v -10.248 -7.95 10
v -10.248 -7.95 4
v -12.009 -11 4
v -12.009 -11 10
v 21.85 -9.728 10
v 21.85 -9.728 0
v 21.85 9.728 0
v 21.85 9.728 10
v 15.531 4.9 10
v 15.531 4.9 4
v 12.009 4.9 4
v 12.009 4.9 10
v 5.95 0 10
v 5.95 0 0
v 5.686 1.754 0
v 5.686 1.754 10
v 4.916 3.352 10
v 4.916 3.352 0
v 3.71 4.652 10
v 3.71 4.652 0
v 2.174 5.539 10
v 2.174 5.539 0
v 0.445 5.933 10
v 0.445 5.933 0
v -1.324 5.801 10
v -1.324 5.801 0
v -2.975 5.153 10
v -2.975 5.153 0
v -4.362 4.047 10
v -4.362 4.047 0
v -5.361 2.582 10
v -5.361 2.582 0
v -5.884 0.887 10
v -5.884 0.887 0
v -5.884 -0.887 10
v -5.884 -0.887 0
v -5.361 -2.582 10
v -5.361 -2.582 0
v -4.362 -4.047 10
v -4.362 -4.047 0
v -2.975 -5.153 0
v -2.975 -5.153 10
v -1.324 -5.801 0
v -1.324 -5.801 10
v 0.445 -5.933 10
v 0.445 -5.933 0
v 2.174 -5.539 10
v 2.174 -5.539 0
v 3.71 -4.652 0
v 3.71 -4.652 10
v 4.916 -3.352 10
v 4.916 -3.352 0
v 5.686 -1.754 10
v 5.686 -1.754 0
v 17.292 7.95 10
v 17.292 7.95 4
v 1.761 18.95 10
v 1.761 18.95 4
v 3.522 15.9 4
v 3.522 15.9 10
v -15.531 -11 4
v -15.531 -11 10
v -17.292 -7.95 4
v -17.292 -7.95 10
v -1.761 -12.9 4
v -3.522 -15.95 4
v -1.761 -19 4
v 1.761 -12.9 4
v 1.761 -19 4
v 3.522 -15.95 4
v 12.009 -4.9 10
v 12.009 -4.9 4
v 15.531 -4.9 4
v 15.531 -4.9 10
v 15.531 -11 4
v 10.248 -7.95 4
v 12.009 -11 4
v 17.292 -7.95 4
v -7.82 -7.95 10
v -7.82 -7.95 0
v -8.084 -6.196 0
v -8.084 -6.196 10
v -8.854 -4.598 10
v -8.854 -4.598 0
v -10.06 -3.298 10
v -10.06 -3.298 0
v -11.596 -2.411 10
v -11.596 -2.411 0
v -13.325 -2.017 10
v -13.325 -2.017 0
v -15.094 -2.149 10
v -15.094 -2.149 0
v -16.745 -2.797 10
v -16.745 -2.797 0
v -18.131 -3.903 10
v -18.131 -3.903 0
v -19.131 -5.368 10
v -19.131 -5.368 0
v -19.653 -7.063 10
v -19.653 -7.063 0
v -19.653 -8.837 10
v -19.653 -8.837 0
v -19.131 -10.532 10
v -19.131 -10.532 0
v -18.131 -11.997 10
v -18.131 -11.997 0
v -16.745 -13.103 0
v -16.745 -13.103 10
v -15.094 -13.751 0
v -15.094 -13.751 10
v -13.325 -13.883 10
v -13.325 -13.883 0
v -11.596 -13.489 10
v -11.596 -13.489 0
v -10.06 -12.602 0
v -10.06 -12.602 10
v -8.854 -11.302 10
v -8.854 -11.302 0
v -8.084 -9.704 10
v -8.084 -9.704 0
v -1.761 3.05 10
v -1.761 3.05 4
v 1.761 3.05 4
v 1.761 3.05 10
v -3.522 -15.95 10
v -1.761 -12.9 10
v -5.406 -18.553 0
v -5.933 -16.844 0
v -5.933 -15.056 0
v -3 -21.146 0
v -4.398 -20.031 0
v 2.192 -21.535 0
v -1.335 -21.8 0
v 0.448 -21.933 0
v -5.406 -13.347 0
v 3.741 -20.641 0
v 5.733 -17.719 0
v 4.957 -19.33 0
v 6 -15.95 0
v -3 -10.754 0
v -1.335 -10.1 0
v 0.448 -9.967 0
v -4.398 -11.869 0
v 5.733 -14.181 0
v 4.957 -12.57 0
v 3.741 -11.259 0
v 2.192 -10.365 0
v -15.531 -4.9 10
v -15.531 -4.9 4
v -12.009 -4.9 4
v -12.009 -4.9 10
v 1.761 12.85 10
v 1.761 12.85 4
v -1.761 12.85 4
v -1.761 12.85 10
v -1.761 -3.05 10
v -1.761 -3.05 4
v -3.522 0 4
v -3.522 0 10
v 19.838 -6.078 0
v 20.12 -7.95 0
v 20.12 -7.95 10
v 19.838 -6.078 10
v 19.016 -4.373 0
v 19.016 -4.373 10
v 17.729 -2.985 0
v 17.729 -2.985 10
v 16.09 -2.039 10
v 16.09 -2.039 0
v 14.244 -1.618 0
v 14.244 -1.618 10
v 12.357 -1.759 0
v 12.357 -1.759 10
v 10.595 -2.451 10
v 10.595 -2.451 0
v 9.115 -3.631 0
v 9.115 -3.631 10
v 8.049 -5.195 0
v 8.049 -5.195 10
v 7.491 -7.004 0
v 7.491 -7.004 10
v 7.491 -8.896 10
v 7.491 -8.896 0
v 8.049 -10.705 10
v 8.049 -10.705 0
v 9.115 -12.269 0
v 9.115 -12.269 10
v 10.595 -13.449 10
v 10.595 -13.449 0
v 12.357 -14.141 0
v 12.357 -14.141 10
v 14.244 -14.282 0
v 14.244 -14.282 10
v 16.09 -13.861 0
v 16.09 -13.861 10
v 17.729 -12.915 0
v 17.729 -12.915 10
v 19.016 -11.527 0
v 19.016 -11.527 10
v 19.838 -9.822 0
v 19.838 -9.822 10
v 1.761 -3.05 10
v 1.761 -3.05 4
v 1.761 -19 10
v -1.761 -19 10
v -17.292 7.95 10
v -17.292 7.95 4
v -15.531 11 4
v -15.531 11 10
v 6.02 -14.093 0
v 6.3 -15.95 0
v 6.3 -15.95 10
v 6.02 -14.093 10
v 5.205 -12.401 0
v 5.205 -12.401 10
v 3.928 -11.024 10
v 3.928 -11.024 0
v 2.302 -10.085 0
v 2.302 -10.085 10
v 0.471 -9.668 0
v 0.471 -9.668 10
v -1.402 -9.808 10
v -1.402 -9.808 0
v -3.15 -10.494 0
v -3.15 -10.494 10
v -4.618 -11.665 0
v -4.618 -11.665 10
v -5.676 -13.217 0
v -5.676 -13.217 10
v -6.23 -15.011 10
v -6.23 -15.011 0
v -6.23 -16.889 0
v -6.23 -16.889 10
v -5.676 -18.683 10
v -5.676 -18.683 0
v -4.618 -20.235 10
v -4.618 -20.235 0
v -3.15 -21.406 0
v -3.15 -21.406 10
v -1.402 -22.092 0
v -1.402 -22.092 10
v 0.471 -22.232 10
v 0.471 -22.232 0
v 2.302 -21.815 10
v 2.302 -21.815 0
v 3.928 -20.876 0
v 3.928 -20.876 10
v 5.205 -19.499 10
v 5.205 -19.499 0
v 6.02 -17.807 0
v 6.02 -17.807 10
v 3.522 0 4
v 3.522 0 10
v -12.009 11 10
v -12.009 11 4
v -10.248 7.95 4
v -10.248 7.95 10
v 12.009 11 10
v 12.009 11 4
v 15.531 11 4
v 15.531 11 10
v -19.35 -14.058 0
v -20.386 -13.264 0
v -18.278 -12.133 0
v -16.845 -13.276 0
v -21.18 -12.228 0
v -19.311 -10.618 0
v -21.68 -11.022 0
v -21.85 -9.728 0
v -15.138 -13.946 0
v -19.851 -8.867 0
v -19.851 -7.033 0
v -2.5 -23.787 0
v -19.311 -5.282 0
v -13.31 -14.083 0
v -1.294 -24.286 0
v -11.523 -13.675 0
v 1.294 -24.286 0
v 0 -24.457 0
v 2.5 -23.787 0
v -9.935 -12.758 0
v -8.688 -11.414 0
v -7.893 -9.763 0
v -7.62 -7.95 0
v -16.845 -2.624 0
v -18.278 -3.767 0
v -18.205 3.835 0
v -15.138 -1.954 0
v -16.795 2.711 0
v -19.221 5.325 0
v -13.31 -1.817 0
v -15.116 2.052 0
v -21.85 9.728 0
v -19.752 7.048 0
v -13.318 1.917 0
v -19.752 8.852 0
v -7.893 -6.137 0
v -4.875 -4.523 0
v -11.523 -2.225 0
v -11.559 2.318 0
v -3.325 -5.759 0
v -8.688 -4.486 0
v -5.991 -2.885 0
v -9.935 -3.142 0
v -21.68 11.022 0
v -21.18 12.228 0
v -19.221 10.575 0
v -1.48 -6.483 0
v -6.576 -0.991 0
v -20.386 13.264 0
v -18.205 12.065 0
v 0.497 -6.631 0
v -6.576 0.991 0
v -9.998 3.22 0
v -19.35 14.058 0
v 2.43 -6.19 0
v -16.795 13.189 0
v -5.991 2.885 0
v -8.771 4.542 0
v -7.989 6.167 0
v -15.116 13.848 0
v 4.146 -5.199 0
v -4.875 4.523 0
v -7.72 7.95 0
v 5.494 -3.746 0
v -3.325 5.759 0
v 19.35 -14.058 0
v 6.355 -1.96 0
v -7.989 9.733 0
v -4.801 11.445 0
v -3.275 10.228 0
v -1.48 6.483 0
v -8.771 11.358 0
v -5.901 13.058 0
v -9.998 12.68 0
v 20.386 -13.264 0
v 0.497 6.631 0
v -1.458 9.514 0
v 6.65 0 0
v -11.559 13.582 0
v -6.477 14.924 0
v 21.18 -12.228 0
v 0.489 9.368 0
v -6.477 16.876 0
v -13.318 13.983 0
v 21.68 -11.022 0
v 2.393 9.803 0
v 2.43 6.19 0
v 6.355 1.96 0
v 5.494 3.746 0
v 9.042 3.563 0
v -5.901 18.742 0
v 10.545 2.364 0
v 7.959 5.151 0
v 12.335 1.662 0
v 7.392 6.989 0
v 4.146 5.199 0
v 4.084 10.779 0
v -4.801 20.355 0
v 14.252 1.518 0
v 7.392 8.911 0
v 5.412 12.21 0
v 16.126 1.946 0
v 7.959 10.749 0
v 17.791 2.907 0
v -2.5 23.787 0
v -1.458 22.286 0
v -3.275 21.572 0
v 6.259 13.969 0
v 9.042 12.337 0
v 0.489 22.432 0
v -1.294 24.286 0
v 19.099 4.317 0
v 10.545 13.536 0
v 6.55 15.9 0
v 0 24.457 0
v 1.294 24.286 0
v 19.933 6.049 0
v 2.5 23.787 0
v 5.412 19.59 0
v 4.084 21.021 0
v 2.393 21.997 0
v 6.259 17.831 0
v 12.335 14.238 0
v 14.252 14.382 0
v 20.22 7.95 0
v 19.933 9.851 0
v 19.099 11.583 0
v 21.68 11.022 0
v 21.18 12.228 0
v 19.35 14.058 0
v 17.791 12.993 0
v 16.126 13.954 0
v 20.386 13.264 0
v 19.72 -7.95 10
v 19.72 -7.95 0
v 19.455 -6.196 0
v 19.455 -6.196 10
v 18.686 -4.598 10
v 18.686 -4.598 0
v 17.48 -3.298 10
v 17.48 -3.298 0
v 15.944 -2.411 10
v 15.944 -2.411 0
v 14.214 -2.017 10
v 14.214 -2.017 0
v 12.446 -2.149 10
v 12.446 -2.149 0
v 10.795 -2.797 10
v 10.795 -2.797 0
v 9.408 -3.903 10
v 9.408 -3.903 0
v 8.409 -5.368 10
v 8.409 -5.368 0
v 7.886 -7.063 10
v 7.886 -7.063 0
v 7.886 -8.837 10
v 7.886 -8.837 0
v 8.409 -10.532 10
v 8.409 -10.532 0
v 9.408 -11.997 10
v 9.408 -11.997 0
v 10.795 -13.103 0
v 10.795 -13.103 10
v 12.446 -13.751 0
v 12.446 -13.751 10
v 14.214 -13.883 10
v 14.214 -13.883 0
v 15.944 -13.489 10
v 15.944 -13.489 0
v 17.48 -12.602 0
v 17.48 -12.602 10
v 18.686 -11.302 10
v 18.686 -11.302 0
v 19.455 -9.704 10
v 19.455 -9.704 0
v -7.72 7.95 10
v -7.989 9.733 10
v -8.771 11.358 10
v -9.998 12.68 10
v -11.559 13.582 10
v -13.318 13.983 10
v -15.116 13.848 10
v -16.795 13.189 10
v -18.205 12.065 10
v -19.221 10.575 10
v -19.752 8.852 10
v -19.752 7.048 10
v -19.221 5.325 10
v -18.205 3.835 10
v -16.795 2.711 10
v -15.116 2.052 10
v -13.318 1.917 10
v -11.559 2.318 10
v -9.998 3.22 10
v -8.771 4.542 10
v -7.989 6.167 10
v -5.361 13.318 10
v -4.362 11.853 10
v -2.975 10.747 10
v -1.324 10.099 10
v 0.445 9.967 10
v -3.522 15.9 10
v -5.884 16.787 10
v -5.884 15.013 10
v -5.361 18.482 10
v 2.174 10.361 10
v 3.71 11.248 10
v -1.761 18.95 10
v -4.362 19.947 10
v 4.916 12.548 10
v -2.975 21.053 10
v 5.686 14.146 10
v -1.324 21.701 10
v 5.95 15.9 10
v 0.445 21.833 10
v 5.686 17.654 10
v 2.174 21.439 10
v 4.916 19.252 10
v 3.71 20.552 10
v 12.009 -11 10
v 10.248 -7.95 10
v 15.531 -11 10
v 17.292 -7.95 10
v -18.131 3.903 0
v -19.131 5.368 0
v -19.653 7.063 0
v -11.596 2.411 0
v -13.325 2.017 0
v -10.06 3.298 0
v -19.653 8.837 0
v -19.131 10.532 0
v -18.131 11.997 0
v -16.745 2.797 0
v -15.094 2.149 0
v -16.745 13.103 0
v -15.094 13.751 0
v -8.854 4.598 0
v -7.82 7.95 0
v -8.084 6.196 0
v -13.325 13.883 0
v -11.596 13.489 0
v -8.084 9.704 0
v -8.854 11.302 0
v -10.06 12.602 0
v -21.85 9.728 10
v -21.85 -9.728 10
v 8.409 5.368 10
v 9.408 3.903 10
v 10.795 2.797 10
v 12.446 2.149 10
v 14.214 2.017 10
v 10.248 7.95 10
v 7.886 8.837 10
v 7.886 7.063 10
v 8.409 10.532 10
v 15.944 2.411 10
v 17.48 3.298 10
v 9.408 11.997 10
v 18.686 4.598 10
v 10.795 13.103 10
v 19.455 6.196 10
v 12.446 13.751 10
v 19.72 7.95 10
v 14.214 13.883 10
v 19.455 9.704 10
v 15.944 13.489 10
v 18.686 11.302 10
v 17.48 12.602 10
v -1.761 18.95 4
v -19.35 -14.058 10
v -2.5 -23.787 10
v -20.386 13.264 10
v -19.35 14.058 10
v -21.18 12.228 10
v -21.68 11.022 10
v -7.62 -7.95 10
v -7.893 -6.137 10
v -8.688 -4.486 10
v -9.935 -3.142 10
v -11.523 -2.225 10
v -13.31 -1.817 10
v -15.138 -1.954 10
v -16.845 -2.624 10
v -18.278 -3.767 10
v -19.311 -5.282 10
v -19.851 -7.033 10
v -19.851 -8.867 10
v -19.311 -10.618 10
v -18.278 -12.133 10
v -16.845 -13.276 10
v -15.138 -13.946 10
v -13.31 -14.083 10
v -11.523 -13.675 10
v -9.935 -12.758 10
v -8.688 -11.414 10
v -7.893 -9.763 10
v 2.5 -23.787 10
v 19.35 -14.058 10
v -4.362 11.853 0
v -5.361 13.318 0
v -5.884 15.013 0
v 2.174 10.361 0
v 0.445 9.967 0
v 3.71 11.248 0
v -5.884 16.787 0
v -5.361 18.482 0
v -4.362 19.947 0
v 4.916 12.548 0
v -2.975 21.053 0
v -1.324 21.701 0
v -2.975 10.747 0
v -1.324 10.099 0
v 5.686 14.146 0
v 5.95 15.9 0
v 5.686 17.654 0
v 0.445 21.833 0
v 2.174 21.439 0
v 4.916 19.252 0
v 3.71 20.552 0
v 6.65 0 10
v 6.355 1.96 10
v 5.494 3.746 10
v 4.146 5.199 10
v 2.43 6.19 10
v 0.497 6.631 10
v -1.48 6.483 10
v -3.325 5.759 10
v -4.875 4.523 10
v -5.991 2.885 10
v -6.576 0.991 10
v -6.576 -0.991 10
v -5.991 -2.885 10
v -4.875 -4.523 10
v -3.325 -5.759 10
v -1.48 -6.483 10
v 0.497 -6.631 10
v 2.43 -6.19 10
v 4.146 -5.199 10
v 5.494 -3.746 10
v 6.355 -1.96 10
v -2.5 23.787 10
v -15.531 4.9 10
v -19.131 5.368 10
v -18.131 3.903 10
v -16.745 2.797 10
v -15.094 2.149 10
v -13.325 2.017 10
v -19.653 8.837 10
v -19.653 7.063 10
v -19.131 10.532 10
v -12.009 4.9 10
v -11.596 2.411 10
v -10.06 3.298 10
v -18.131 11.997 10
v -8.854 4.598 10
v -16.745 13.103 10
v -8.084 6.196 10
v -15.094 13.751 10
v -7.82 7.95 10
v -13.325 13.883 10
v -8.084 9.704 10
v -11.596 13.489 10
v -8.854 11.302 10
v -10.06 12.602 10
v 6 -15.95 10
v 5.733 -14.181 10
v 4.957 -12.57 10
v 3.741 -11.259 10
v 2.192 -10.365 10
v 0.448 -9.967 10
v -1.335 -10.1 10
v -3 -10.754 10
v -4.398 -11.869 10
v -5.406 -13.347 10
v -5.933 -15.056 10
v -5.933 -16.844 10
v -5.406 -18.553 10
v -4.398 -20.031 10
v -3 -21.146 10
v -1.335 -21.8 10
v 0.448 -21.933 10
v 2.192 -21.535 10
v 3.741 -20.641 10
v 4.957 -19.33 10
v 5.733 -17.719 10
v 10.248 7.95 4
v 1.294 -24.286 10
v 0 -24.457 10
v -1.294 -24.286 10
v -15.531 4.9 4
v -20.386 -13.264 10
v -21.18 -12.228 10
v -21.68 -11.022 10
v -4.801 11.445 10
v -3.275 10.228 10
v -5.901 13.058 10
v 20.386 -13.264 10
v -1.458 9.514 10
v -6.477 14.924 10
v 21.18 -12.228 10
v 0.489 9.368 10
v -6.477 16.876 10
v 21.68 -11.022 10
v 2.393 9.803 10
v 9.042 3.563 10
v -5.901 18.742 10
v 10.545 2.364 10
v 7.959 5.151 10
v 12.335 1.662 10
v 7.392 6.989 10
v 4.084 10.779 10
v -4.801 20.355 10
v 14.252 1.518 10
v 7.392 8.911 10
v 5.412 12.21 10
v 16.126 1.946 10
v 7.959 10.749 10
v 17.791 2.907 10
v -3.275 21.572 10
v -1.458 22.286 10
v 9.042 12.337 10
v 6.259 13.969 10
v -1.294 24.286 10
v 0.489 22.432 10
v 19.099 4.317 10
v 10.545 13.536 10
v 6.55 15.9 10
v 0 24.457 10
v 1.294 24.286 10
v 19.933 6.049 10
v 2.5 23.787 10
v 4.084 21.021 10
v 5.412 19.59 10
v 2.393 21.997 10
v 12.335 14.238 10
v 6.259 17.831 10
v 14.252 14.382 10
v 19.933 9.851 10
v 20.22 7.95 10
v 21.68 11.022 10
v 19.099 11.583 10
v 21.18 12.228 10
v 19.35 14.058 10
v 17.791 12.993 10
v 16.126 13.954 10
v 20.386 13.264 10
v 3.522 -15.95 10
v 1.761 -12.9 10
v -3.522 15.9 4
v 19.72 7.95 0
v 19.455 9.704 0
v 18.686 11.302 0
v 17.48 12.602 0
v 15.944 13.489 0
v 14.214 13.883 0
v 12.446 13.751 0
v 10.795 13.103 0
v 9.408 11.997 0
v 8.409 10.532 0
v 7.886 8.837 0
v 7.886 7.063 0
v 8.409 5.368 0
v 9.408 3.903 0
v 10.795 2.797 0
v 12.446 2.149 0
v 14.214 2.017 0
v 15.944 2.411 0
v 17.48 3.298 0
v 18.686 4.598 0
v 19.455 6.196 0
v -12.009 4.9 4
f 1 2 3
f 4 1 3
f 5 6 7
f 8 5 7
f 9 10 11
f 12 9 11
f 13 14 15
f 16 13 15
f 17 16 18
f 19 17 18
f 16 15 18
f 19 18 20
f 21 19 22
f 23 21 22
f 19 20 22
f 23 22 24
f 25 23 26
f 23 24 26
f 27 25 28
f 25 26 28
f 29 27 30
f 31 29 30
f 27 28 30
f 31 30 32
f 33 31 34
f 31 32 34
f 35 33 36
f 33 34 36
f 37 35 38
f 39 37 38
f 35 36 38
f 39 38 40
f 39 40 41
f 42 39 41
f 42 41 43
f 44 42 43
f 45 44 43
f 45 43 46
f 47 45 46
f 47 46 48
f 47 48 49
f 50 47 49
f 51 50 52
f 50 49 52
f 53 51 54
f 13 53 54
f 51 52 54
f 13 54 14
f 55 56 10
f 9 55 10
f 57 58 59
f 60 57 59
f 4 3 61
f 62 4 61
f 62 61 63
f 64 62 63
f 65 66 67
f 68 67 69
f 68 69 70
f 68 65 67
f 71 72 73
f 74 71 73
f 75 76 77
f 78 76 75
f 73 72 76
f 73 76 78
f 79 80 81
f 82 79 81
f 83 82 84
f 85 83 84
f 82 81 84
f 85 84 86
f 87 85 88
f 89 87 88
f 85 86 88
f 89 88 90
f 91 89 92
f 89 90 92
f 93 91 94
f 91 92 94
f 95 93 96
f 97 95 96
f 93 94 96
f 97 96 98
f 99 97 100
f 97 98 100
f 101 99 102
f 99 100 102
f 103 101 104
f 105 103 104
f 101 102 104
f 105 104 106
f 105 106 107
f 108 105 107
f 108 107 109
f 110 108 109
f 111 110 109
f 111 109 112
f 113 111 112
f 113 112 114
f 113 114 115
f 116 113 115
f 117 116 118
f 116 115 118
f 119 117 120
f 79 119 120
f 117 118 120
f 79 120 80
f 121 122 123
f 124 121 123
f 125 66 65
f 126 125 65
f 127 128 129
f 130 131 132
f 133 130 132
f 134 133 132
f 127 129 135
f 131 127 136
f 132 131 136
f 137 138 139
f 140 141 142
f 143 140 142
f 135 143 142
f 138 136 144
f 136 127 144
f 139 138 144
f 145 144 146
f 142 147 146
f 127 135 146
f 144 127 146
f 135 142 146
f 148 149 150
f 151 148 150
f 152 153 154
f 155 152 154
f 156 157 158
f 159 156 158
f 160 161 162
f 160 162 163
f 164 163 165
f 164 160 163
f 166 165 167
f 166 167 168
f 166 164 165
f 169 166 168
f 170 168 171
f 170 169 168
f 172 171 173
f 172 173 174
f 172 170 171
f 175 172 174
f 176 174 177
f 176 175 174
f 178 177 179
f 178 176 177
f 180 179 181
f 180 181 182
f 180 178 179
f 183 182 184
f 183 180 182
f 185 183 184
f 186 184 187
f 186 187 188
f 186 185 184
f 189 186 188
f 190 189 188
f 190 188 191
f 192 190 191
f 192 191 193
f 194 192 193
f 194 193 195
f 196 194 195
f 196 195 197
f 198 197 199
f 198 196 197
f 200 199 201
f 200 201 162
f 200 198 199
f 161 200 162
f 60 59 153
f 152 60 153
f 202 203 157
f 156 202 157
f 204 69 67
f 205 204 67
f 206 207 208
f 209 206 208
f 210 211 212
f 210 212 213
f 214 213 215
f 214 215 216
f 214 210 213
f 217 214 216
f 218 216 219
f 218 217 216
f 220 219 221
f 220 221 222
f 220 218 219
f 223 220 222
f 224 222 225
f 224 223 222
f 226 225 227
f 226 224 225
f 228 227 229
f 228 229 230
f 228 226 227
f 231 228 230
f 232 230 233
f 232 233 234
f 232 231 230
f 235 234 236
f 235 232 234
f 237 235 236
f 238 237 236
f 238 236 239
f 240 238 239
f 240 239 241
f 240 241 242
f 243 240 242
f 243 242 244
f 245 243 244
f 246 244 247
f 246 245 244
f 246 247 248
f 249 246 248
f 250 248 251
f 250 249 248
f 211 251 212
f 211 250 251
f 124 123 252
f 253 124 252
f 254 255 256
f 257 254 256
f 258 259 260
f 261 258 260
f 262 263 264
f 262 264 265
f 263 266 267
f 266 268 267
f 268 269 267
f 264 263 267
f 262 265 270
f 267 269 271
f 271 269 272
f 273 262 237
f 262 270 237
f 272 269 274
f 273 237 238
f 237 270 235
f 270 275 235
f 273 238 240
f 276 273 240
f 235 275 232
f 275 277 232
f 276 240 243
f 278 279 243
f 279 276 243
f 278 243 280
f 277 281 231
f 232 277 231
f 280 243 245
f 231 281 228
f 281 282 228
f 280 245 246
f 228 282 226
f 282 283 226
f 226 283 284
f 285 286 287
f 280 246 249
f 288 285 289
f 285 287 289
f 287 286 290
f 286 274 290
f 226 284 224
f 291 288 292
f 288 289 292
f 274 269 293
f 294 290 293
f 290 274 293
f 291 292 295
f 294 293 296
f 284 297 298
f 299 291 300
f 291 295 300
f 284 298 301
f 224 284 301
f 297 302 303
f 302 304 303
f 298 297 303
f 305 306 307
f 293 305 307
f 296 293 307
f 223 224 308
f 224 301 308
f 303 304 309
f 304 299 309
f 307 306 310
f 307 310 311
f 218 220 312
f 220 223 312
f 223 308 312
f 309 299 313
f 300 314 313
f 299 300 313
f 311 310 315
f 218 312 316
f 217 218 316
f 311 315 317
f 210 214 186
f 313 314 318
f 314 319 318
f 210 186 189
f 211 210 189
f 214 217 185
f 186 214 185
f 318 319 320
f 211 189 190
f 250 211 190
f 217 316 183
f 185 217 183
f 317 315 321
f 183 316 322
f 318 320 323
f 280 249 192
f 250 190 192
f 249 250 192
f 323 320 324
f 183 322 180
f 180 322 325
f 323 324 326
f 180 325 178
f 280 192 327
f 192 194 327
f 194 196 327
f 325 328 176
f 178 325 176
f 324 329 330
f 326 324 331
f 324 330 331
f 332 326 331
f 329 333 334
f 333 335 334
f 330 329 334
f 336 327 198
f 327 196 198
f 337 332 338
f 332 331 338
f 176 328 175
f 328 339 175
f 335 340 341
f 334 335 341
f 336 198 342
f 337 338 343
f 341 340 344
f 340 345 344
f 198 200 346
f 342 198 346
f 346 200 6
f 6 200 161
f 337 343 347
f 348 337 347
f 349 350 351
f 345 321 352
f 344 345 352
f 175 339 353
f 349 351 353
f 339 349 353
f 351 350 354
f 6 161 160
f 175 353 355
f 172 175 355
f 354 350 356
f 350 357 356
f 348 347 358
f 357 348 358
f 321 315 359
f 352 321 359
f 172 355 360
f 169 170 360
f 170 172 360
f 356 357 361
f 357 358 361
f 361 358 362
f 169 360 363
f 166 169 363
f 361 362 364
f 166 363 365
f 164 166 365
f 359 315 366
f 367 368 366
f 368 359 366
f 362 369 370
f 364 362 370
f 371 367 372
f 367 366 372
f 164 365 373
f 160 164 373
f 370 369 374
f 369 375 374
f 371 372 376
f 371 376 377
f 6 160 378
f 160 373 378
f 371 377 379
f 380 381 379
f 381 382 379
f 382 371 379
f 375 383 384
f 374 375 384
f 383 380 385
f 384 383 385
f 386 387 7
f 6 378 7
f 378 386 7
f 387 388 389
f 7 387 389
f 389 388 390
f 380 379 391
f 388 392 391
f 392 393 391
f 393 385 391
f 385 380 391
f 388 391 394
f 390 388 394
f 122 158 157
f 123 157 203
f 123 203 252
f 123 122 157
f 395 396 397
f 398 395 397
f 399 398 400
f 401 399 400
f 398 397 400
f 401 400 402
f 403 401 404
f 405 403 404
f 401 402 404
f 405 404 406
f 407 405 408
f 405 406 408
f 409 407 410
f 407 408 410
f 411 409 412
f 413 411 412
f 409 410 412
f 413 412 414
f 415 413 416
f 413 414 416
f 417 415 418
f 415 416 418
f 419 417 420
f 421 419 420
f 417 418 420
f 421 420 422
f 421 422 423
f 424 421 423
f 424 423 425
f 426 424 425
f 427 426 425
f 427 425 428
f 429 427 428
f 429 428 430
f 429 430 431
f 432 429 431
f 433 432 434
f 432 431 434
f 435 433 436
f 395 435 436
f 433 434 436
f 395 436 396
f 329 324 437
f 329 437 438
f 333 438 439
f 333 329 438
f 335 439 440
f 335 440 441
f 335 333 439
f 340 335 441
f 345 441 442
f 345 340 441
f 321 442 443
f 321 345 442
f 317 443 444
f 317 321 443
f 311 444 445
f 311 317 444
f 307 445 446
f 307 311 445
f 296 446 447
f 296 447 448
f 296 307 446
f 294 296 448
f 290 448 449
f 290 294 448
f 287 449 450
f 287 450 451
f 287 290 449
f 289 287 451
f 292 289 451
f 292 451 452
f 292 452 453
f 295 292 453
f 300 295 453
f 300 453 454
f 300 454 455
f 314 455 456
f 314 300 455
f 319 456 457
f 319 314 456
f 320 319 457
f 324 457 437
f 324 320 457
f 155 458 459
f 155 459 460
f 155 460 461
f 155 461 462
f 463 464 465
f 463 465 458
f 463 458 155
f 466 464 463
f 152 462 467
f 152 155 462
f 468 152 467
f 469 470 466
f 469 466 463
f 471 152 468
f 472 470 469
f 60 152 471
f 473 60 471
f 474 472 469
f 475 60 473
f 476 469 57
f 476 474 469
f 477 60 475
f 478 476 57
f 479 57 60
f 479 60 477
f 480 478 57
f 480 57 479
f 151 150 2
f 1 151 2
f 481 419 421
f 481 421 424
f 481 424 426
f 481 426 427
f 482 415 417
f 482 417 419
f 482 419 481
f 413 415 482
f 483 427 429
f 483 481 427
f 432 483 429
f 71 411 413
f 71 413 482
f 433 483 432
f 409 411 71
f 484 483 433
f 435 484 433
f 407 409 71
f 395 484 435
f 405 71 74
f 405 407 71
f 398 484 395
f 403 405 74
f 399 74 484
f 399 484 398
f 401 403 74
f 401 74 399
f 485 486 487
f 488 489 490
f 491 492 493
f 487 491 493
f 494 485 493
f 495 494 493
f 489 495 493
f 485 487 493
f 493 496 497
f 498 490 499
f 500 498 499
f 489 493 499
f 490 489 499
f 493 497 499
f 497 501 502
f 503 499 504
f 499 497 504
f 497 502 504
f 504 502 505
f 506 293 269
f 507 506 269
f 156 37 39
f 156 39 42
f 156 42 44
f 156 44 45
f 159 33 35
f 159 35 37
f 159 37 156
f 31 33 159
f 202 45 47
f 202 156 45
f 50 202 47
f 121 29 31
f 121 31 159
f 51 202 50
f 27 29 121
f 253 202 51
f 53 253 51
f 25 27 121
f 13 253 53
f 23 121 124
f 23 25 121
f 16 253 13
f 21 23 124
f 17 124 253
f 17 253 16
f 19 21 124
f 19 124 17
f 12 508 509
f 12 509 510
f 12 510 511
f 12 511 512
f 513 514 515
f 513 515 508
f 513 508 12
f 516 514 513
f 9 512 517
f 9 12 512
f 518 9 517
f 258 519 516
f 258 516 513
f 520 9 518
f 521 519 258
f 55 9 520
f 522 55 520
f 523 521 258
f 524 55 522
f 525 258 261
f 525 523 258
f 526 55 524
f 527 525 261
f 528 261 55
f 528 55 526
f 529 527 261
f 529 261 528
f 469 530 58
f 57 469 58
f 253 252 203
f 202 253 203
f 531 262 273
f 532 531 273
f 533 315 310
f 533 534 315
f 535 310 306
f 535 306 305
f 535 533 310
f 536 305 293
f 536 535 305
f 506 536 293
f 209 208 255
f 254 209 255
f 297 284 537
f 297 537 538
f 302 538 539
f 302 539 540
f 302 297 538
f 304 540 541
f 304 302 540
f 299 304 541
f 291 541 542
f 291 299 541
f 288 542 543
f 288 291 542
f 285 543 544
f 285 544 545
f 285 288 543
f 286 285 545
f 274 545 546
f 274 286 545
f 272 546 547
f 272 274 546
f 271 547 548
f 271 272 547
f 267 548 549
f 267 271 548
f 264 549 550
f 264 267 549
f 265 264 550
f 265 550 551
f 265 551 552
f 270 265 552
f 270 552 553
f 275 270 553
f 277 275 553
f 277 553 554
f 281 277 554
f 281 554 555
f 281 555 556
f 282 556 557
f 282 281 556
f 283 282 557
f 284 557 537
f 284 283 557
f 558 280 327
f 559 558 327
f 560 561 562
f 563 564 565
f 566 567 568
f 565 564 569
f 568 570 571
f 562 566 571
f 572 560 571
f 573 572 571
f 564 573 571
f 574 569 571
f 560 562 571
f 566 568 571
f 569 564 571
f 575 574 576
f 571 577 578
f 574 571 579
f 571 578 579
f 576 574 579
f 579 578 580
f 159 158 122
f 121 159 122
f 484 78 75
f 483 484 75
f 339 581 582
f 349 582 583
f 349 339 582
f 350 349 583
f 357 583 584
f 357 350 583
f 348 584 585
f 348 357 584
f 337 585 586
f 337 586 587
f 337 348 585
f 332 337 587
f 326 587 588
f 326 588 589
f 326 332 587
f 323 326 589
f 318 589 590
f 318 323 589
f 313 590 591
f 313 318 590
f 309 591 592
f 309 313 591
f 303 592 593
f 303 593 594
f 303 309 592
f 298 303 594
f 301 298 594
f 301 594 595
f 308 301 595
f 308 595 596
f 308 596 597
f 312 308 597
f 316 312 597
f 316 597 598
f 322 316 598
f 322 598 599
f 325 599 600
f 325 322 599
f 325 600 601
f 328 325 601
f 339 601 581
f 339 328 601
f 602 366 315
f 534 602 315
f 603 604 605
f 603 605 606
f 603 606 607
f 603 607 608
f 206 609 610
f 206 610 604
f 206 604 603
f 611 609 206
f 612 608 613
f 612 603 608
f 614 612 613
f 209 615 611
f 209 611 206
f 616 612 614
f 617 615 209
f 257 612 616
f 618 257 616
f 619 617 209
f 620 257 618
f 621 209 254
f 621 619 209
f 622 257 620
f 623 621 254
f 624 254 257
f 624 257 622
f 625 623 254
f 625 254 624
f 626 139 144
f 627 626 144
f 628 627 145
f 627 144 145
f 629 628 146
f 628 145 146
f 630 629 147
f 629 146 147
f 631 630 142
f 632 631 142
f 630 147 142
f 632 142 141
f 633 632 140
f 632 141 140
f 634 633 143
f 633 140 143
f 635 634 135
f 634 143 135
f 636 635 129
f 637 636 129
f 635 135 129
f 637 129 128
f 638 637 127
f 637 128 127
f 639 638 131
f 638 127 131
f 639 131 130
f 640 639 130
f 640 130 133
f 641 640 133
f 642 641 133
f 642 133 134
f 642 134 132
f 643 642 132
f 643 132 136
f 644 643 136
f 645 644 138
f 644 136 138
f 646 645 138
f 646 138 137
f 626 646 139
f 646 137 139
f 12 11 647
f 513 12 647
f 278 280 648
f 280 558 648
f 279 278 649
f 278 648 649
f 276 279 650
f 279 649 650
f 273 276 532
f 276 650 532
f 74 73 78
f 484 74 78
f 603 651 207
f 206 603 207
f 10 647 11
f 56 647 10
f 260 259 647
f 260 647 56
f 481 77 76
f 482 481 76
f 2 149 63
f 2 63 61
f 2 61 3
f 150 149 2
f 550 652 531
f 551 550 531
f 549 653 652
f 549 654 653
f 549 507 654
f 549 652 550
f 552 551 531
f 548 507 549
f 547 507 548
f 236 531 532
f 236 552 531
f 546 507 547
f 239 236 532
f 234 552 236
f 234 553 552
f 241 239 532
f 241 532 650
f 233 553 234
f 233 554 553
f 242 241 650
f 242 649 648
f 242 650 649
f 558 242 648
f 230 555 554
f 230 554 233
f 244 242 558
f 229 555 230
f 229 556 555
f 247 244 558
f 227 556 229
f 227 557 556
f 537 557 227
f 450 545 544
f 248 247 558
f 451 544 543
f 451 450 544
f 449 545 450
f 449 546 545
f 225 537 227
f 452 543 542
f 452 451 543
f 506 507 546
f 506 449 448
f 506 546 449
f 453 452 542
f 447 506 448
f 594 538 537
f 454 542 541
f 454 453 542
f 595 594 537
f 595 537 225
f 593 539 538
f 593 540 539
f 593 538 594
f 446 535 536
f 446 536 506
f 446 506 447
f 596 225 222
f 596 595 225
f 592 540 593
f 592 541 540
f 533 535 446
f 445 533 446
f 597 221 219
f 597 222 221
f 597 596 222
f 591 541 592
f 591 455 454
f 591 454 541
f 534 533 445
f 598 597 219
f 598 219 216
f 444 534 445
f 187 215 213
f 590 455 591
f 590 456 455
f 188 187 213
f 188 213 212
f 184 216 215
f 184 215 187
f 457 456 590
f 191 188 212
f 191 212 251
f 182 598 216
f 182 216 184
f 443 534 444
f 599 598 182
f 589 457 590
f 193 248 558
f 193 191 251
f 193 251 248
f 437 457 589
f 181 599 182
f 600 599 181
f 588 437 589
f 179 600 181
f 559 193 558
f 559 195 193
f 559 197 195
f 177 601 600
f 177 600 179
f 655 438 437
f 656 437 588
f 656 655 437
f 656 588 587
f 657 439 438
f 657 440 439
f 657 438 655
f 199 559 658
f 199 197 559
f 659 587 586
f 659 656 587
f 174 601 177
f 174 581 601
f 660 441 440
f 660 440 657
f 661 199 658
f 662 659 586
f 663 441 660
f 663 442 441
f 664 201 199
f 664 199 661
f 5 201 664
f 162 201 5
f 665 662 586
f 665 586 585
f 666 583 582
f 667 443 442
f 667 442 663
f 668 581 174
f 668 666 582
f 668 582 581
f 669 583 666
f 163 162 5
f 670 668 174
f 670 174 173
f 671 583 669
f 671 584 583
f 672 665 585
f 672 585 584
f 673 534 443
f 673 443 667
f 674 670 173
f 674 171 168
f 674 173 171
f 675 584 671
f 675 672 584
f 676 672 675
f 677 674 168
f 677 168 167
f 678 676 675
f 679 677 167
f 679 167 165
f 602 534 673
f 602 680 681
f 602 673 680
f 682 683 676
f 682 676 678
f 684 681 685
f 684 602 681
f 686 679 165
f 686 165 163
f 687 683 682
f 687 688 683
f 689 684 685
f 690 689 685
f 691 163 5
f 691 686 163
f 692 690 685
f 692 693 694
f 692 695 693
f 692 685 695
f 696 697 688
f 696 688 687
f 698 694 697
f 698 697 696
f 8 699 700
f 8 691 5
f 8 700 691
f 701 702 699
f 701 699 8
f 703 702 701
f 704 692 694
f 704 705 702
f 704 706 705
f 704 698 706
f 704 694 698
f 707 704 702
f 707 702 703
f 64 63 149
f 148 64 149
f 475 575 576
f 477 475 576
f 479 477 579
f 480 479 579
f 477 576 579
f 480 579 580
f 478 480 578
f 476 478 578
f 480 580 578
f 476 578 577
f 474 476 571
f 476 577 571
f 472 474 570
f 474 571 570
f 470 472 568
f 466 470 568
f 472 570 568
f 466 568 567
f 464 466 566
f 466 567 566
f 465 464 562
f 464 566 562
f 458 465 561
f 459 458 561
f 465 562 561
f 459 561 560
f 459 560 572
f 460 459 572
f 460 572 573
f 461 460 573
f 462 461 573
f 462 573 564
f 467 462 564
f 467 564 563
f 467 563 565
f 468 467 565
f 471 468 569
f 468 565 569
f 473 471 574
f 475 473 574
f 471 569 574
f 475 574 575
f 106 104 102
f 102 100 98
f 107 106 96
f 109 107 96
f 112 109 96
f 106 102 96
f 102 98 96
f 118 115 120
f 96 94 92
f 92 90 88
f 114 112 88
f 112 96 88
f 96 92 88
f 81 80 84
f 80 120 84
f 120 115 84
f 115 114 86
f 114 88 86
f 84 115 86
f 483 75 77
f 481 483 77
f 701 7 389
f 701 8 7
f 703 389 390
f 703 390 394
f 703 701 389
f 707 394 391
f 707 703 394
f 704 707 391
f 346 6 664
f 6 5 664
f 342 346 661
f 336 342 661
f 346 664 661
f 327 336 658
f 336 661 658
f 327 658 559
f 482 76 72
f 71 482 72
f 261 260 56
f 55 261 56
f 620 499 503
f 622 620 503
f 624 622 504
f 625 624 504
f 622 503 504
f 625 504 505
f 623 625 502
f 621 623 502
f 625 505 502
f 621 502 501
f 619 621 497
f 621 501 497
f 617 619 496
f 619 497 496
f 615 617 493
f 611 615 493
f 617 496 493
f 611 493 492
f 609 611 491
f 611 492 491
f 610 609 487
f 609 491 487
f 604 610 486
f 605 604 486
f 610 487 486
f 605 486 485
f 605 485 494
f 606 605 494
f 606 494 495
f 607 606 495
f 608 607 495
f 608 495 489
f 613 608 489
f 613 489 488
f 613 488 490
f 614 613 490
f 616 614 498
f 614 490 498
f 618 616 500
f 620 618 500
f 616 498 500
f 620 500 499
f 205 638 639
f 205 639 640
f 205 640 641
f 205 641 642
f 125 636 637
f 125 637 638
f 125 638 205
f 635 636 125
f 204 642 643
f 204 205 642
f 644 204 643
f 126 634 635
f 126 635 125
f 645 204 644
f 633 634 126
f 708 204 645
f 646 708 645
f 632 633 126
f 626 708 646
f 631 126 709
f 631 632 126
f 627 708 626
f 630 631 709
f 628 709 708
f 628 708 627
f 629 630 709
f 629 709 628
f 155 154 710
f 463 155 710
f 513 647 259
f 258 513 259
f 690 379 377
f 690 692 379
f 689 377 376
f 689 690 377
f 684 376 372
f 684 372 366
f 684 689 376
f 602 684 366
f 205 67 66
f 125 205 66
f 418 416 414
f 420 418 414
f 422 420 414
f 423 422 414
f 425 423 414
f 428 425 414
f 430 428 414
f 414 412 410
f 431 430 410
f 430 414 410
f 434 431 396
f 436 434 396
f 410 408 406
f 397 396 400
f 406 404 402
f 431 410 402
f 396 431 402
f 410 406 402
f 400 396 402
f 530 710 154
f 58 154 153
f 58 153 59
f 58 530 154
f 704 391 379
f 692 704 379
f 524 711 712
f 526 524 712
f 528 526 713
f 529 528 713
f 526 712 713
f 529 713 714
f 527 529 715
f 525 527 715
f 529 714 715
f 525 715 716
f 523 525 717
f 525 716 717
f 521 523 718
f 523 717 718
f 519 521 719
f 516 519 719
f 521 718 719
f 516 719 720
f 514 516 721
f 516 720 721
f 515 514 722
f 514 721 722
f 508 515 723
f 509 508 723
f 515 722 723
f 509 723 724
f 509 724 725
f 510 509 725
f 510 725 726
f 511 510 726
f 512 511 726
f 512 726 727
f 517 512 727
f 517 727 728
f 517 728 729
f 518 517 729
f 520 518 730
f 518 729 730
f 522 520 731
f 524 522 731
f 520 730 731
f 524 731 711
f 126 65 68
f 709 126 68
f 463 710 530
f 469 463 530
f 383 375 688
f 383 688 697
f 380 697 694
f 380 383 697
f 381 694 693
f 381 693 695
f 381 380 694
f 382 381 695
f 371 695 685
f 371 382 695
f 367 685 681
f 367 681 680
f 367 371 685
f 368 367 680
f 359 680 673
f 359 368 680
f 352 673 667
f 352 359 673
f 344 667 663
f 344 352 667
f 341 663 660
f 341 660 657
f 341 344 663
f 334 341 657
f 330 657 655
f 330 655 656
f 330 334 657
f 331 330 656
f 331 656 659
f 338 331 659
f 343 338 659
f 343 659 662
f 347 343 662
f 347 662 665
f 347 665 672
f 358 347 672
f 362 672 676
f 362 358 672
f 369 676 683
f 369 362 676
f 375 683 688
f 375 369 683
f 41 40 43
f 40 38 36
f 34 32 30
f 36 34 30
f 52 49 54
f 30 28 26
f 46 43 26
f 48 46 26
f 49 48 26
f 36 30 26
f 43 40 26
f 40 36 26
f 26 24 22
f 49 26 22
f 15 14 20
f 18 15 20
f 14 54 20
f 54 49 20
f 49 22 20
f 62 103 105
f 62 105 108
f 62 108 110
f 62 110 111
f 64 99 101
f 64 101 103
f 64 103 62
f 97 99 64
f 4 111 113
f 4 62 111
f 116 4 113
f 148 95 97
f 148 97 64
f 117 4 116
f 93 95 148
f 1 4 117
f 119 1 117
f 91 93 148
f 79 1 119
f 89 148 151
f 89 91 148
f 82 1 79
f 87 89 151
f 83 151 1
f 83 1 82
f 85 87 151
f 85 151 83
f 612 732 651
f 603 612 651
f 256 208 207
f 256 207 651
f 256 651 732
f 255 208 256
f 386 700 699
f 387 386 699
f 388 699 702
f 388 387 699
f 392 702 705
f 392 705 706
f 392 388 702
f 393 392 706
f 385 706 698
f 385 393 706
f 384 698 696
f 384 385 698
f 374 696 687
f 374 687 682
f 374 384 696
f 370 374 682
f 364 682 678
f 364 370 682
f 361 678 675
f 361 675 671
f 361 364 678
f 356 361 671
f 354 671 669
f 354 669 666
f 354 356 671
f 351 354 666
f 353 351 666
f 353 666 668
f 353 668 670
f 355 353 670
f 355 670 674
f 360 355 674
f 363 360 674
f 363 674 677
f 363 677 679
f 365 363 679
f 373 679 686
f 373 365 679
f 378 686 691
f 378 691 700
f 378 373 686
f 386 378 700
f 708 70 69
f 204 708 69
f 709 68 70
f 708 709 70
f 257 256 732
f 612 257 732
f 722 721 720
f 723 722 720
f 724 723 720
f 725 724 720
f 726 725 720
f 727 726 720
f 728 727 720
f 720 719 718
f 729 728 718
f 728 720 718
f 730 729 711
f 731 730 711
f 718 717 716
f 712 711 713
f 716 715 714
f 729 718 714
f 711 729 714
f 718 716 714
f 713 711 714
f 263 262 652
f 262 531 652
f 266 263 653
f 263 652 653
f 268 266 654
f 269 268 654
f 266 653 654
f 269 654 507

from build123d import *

# Parameters (mm, degrees)
F2_R      = 6.15
F2_R_2    = 6.3
F2_R_3    = 6.35
F2_R_4    = 6.05
F2_R_5    = 6.65
F2_R_6    = 6.45
F2_R_7    = 6.55
F3_DEPTH  = 10
F4_R      = 5
F2_R_8    = 5.95
F5_DEPTH  = 10
F6_DEPTH  = 4
F7_DEPTH  = 10
F8_DEPTH  = 4
F2_R_9    = 6
F9_DEPTH  = 10
F10_DEPTH = 4
F11_DEPTH = 10
F12_DEPTH = 4
F13_DEPTH = 10
F14_DEPTH = 4
F15_DEPTH = 10
F16_DEPTH = 4
F17_DEPTH = 10
F18_DEPTH = 4


with BuildPart() as f3:
    # F2 (on Top) → F3 (new body)
    with BuildSketch(Plane.XY):
        Polygon((21.85, -12.6151033818), (21.85, 12.6151033818), (0, 25.2302067636), (-21.85, 12.6151033818), (-21.85, -12.6151033818), (0, -25.2302067636), align=None)
        with Locations((-13.7698039202, -7.95)):
            Circle(F2_R, mode=Mode.SUBTRACT)
        with Locations((0, -15.95)):
            Circle(F2_R_2, mode=Mode.SUBTRACT)
        with Locations((13.7698039202, -7.95)):
            Circle(F2_R_3, mode=Mode.SUBTRACT)
        with Locations((-13.7698039202, 7.95)):
            Circle(F2_R_4, mode=Mode.SUBTRACT)
        Circle(F2_R_5, mode=Mode.SUBTRACT)
        with Locations((13.7698039202, 7.95)):
            Circle(F2_R_6, mode=Mode.SUBTRACT)
        with Locations((0, 15.9)):
            Circle(F2_R_7, mode=Mode.SUBTRACT)
    extrude(amount=F3_DEPTH)

    # F4
    f4_edges = [f3.edges().sort_by_distance(p)[0] for p in [
        (-21.85, 12.615103, 5),
        (-21.85, -12.615103, 5),
        (0, -25.230207, 5),
        (0, 25.230207, 5),
        (21.85, -12.615103, 5),
        (21.85, 12.615103, 5),
    ]]
    fillet(f4_edges, radius=F4_R)


with BuildPart() as f5:
    # F2 (on Top) → F5 (new body)
    with BuildSketch(Plane.XY):
        with Locations((-13.7698039202, 7.95)):
            Circle(F2_R_8)
        Polygon((-15.5307222412, 11), (-12.0088855991, 11), (-10.2479672781, 7.95), (-12.0088855991, 4.9), (-15.5307222412, 4.9), (-17.2916405622, 7.95), align=None, mode=Mode.SUBTRACT)
    extrude(amount=F5_DEPTH)

    # F2 (on Top) → F6 (join)
    with BuildSketch(Plane.XY):
        Polygon((-10.2479672781, 7.95), (-12.0088855991, 11), (-15.5307222412, 11), (-17.2916405622, 7.95), (-15.5307222412, 4.9), (-12.0088855991, 4.9), align=None)
    extrude(amount=F6_DEPTH)


with BuildPart() as f7:
    # F2 (on Top) → F7 (new body)
    with BuildSketch(Plane.XY):
        with Locations((-13.7698039202, -7.95)):
            Circle(F2_R_8)
        Polygon((-15.5307222412, -4.9), (-12.0088855991, -4.9), (-10.2479672781, -7.95), (-12.0088855991, -11), (-15.5307222412, -11), (-17.2916405622, -7.95), align=None, mode=Mode.SUBTRACT)
    extrude(amount=F7_DEPTH)

    # F2 (on Top) → F8 (join)
    with BuildSketch(Plane.XY):
        Polygon((-10.2479672781, -7.95), (-12.0088855991, -4.9), (-15.5307222412, -4.9), (-17.2916405622, -7.95), (-15.5307222412, -11), (-12.0088855991, -11), align=None)
    extrude(amount=F8_DEPTH)


with BuildPart() as f9:
    # F2 (on Top) → F9 (new body)
    with BuildSketch(Plane.XY):
        with Locations((0, -15.95)):
            Circle(F2_R_9)
        Polygon((-1.760918321, -12.9), (1.760918321, -12.9), (3.5218366421, -15.95), (1.760918321, -19), (-1.760918321, -19), (-3.5218366421, -15.95), align=None, mode=Mode.SUBTRACT)
    extrude(amount=F9_DEPTH)

    # F2 (on Top) → F10 (join)
    with BuildSketch(Plane.XY):
        Polygon((3.5218366421, -15.95), (1.760918321, -12.9), (-1.760918321, -12.9), (-3.5218366421, -15.95), (-1.760918321, -19), (1.760918321, -19), align=None)
    extrude(amount=F10_DEPTH)


with BuildPart() as f11:
    # F2 (on Top) → F11 (new body)
    with BuildSketch(Plane.XY):
        with Locations((13.7698039202, -7.95)):
            Circle(F2_R_8)
        Polygon((12.0088855991, -4.9), (15.5307222412, -4.9), (17.2916405622, -7.95), (15.5307222412, -11), (12.0088855991, -11), (10.2479672781, -7.95), align=None, mode=Mode.SUBTRACT)
    extrude(amount=F11_DEPTH)

    # F2 (on Top) → F12 (join)
    with BuildSketch(Plane.XY):
        Polygon((17.2916405622, -7.95), (15.5307222412, -4.9), (12.0088855991, -4.9), (10.2479672781, -7.95), (12.0088855991, -11), (15.5307222412, -11), align=None)
    extrude(amount=F12_DEPTH)


with BuildPart() as f13:
    # F2 (on Top) → F13 (new body)
    with BuildSketch(Plane.XY):
        with Locations((13.7698039202, 7.95)):
            Circle(F2_R_8)
        Polygon((12.0088855991, 11), (15.5307222412, 11), (17.2916405622, 7.95), (15.5307222412, 4.9), (12.0088855991, 4.9), (10.2479672781, 7.95), align=None, mode=Mode.SUBTRACT)
    extrude(amount=F13_DEPTH)

    # F2 (on Top) → F14 (join)
    with BuildSketch(Plane.XY):
        Polygon((17.2916405622, 7.95), (15.5307222412, 11), (12.0088855991, 11), (10.2479672781, 7.95), (12.0088855991, 4.9), (15.5307222412, 4.9), align=None)
    extrude(amount=F14_DEPTH)


with BuildPart() as f15:
    # F2 (on Top) → F15 (new body)
    with BuildSketch(Plane.XY):
        with Locations((0, 15.9)):
            Circle(F2_R_8)
        Polygon((-1.760918321, 18.95), (1.760918321, 18.95), (3.5218366421, 15.9), (1.760918321, 12.85), (-1.760918321, 12.85), (-3.5218366421, 15.9), align=None, mode=Mode.SUBTRACT)
    extrude(amount=F15_DEPTH)

    # F2 (on Top) → F16 (join)
    with BuildSketch(Plane.XY):
        Polygon((3.5218366421, 15.9), (1.760918321, 18.95), (-1.760918321, 18.95), (-3.5218366421, 15.9), (-1.760918321, 12.85), (1.760918321, 12.85), align=None)
    extrude(amount=F16_DEPTH)


with BuildPart() as f17:
    # F2 (on Top) → F17 (new body)
    with BuildSketch(Plane.XY):
        Circle(F2_R_8)
        Polygon((-1.760918321, 3.05), (1.760918321, 3.05), (3.5218366421, 0), (1.760918321, -3.05), (-1.760918321, -3.05), (-3.5218366421, 0), align=None, mode=Mode.SUBTRACT)
    extrude(amount=F17_DEPTH)

    # F2 (on Top) → F18 (join)
    with BuildSketch(Plane.XY):
        Polygon((3.5218366421, 0), (1.760918321, 3.05), (-1.760918321, 3.05), (-3.5218366421, 0), (-1.760918321, -3.05), (1.760918321, -3.05), align=None)
    extrude(amount=F18_DEPTH)


solid = Compound([f3.part, f5.part, f7.part, f9.part, f11.part, f13.part, f15.part, f17.part])
